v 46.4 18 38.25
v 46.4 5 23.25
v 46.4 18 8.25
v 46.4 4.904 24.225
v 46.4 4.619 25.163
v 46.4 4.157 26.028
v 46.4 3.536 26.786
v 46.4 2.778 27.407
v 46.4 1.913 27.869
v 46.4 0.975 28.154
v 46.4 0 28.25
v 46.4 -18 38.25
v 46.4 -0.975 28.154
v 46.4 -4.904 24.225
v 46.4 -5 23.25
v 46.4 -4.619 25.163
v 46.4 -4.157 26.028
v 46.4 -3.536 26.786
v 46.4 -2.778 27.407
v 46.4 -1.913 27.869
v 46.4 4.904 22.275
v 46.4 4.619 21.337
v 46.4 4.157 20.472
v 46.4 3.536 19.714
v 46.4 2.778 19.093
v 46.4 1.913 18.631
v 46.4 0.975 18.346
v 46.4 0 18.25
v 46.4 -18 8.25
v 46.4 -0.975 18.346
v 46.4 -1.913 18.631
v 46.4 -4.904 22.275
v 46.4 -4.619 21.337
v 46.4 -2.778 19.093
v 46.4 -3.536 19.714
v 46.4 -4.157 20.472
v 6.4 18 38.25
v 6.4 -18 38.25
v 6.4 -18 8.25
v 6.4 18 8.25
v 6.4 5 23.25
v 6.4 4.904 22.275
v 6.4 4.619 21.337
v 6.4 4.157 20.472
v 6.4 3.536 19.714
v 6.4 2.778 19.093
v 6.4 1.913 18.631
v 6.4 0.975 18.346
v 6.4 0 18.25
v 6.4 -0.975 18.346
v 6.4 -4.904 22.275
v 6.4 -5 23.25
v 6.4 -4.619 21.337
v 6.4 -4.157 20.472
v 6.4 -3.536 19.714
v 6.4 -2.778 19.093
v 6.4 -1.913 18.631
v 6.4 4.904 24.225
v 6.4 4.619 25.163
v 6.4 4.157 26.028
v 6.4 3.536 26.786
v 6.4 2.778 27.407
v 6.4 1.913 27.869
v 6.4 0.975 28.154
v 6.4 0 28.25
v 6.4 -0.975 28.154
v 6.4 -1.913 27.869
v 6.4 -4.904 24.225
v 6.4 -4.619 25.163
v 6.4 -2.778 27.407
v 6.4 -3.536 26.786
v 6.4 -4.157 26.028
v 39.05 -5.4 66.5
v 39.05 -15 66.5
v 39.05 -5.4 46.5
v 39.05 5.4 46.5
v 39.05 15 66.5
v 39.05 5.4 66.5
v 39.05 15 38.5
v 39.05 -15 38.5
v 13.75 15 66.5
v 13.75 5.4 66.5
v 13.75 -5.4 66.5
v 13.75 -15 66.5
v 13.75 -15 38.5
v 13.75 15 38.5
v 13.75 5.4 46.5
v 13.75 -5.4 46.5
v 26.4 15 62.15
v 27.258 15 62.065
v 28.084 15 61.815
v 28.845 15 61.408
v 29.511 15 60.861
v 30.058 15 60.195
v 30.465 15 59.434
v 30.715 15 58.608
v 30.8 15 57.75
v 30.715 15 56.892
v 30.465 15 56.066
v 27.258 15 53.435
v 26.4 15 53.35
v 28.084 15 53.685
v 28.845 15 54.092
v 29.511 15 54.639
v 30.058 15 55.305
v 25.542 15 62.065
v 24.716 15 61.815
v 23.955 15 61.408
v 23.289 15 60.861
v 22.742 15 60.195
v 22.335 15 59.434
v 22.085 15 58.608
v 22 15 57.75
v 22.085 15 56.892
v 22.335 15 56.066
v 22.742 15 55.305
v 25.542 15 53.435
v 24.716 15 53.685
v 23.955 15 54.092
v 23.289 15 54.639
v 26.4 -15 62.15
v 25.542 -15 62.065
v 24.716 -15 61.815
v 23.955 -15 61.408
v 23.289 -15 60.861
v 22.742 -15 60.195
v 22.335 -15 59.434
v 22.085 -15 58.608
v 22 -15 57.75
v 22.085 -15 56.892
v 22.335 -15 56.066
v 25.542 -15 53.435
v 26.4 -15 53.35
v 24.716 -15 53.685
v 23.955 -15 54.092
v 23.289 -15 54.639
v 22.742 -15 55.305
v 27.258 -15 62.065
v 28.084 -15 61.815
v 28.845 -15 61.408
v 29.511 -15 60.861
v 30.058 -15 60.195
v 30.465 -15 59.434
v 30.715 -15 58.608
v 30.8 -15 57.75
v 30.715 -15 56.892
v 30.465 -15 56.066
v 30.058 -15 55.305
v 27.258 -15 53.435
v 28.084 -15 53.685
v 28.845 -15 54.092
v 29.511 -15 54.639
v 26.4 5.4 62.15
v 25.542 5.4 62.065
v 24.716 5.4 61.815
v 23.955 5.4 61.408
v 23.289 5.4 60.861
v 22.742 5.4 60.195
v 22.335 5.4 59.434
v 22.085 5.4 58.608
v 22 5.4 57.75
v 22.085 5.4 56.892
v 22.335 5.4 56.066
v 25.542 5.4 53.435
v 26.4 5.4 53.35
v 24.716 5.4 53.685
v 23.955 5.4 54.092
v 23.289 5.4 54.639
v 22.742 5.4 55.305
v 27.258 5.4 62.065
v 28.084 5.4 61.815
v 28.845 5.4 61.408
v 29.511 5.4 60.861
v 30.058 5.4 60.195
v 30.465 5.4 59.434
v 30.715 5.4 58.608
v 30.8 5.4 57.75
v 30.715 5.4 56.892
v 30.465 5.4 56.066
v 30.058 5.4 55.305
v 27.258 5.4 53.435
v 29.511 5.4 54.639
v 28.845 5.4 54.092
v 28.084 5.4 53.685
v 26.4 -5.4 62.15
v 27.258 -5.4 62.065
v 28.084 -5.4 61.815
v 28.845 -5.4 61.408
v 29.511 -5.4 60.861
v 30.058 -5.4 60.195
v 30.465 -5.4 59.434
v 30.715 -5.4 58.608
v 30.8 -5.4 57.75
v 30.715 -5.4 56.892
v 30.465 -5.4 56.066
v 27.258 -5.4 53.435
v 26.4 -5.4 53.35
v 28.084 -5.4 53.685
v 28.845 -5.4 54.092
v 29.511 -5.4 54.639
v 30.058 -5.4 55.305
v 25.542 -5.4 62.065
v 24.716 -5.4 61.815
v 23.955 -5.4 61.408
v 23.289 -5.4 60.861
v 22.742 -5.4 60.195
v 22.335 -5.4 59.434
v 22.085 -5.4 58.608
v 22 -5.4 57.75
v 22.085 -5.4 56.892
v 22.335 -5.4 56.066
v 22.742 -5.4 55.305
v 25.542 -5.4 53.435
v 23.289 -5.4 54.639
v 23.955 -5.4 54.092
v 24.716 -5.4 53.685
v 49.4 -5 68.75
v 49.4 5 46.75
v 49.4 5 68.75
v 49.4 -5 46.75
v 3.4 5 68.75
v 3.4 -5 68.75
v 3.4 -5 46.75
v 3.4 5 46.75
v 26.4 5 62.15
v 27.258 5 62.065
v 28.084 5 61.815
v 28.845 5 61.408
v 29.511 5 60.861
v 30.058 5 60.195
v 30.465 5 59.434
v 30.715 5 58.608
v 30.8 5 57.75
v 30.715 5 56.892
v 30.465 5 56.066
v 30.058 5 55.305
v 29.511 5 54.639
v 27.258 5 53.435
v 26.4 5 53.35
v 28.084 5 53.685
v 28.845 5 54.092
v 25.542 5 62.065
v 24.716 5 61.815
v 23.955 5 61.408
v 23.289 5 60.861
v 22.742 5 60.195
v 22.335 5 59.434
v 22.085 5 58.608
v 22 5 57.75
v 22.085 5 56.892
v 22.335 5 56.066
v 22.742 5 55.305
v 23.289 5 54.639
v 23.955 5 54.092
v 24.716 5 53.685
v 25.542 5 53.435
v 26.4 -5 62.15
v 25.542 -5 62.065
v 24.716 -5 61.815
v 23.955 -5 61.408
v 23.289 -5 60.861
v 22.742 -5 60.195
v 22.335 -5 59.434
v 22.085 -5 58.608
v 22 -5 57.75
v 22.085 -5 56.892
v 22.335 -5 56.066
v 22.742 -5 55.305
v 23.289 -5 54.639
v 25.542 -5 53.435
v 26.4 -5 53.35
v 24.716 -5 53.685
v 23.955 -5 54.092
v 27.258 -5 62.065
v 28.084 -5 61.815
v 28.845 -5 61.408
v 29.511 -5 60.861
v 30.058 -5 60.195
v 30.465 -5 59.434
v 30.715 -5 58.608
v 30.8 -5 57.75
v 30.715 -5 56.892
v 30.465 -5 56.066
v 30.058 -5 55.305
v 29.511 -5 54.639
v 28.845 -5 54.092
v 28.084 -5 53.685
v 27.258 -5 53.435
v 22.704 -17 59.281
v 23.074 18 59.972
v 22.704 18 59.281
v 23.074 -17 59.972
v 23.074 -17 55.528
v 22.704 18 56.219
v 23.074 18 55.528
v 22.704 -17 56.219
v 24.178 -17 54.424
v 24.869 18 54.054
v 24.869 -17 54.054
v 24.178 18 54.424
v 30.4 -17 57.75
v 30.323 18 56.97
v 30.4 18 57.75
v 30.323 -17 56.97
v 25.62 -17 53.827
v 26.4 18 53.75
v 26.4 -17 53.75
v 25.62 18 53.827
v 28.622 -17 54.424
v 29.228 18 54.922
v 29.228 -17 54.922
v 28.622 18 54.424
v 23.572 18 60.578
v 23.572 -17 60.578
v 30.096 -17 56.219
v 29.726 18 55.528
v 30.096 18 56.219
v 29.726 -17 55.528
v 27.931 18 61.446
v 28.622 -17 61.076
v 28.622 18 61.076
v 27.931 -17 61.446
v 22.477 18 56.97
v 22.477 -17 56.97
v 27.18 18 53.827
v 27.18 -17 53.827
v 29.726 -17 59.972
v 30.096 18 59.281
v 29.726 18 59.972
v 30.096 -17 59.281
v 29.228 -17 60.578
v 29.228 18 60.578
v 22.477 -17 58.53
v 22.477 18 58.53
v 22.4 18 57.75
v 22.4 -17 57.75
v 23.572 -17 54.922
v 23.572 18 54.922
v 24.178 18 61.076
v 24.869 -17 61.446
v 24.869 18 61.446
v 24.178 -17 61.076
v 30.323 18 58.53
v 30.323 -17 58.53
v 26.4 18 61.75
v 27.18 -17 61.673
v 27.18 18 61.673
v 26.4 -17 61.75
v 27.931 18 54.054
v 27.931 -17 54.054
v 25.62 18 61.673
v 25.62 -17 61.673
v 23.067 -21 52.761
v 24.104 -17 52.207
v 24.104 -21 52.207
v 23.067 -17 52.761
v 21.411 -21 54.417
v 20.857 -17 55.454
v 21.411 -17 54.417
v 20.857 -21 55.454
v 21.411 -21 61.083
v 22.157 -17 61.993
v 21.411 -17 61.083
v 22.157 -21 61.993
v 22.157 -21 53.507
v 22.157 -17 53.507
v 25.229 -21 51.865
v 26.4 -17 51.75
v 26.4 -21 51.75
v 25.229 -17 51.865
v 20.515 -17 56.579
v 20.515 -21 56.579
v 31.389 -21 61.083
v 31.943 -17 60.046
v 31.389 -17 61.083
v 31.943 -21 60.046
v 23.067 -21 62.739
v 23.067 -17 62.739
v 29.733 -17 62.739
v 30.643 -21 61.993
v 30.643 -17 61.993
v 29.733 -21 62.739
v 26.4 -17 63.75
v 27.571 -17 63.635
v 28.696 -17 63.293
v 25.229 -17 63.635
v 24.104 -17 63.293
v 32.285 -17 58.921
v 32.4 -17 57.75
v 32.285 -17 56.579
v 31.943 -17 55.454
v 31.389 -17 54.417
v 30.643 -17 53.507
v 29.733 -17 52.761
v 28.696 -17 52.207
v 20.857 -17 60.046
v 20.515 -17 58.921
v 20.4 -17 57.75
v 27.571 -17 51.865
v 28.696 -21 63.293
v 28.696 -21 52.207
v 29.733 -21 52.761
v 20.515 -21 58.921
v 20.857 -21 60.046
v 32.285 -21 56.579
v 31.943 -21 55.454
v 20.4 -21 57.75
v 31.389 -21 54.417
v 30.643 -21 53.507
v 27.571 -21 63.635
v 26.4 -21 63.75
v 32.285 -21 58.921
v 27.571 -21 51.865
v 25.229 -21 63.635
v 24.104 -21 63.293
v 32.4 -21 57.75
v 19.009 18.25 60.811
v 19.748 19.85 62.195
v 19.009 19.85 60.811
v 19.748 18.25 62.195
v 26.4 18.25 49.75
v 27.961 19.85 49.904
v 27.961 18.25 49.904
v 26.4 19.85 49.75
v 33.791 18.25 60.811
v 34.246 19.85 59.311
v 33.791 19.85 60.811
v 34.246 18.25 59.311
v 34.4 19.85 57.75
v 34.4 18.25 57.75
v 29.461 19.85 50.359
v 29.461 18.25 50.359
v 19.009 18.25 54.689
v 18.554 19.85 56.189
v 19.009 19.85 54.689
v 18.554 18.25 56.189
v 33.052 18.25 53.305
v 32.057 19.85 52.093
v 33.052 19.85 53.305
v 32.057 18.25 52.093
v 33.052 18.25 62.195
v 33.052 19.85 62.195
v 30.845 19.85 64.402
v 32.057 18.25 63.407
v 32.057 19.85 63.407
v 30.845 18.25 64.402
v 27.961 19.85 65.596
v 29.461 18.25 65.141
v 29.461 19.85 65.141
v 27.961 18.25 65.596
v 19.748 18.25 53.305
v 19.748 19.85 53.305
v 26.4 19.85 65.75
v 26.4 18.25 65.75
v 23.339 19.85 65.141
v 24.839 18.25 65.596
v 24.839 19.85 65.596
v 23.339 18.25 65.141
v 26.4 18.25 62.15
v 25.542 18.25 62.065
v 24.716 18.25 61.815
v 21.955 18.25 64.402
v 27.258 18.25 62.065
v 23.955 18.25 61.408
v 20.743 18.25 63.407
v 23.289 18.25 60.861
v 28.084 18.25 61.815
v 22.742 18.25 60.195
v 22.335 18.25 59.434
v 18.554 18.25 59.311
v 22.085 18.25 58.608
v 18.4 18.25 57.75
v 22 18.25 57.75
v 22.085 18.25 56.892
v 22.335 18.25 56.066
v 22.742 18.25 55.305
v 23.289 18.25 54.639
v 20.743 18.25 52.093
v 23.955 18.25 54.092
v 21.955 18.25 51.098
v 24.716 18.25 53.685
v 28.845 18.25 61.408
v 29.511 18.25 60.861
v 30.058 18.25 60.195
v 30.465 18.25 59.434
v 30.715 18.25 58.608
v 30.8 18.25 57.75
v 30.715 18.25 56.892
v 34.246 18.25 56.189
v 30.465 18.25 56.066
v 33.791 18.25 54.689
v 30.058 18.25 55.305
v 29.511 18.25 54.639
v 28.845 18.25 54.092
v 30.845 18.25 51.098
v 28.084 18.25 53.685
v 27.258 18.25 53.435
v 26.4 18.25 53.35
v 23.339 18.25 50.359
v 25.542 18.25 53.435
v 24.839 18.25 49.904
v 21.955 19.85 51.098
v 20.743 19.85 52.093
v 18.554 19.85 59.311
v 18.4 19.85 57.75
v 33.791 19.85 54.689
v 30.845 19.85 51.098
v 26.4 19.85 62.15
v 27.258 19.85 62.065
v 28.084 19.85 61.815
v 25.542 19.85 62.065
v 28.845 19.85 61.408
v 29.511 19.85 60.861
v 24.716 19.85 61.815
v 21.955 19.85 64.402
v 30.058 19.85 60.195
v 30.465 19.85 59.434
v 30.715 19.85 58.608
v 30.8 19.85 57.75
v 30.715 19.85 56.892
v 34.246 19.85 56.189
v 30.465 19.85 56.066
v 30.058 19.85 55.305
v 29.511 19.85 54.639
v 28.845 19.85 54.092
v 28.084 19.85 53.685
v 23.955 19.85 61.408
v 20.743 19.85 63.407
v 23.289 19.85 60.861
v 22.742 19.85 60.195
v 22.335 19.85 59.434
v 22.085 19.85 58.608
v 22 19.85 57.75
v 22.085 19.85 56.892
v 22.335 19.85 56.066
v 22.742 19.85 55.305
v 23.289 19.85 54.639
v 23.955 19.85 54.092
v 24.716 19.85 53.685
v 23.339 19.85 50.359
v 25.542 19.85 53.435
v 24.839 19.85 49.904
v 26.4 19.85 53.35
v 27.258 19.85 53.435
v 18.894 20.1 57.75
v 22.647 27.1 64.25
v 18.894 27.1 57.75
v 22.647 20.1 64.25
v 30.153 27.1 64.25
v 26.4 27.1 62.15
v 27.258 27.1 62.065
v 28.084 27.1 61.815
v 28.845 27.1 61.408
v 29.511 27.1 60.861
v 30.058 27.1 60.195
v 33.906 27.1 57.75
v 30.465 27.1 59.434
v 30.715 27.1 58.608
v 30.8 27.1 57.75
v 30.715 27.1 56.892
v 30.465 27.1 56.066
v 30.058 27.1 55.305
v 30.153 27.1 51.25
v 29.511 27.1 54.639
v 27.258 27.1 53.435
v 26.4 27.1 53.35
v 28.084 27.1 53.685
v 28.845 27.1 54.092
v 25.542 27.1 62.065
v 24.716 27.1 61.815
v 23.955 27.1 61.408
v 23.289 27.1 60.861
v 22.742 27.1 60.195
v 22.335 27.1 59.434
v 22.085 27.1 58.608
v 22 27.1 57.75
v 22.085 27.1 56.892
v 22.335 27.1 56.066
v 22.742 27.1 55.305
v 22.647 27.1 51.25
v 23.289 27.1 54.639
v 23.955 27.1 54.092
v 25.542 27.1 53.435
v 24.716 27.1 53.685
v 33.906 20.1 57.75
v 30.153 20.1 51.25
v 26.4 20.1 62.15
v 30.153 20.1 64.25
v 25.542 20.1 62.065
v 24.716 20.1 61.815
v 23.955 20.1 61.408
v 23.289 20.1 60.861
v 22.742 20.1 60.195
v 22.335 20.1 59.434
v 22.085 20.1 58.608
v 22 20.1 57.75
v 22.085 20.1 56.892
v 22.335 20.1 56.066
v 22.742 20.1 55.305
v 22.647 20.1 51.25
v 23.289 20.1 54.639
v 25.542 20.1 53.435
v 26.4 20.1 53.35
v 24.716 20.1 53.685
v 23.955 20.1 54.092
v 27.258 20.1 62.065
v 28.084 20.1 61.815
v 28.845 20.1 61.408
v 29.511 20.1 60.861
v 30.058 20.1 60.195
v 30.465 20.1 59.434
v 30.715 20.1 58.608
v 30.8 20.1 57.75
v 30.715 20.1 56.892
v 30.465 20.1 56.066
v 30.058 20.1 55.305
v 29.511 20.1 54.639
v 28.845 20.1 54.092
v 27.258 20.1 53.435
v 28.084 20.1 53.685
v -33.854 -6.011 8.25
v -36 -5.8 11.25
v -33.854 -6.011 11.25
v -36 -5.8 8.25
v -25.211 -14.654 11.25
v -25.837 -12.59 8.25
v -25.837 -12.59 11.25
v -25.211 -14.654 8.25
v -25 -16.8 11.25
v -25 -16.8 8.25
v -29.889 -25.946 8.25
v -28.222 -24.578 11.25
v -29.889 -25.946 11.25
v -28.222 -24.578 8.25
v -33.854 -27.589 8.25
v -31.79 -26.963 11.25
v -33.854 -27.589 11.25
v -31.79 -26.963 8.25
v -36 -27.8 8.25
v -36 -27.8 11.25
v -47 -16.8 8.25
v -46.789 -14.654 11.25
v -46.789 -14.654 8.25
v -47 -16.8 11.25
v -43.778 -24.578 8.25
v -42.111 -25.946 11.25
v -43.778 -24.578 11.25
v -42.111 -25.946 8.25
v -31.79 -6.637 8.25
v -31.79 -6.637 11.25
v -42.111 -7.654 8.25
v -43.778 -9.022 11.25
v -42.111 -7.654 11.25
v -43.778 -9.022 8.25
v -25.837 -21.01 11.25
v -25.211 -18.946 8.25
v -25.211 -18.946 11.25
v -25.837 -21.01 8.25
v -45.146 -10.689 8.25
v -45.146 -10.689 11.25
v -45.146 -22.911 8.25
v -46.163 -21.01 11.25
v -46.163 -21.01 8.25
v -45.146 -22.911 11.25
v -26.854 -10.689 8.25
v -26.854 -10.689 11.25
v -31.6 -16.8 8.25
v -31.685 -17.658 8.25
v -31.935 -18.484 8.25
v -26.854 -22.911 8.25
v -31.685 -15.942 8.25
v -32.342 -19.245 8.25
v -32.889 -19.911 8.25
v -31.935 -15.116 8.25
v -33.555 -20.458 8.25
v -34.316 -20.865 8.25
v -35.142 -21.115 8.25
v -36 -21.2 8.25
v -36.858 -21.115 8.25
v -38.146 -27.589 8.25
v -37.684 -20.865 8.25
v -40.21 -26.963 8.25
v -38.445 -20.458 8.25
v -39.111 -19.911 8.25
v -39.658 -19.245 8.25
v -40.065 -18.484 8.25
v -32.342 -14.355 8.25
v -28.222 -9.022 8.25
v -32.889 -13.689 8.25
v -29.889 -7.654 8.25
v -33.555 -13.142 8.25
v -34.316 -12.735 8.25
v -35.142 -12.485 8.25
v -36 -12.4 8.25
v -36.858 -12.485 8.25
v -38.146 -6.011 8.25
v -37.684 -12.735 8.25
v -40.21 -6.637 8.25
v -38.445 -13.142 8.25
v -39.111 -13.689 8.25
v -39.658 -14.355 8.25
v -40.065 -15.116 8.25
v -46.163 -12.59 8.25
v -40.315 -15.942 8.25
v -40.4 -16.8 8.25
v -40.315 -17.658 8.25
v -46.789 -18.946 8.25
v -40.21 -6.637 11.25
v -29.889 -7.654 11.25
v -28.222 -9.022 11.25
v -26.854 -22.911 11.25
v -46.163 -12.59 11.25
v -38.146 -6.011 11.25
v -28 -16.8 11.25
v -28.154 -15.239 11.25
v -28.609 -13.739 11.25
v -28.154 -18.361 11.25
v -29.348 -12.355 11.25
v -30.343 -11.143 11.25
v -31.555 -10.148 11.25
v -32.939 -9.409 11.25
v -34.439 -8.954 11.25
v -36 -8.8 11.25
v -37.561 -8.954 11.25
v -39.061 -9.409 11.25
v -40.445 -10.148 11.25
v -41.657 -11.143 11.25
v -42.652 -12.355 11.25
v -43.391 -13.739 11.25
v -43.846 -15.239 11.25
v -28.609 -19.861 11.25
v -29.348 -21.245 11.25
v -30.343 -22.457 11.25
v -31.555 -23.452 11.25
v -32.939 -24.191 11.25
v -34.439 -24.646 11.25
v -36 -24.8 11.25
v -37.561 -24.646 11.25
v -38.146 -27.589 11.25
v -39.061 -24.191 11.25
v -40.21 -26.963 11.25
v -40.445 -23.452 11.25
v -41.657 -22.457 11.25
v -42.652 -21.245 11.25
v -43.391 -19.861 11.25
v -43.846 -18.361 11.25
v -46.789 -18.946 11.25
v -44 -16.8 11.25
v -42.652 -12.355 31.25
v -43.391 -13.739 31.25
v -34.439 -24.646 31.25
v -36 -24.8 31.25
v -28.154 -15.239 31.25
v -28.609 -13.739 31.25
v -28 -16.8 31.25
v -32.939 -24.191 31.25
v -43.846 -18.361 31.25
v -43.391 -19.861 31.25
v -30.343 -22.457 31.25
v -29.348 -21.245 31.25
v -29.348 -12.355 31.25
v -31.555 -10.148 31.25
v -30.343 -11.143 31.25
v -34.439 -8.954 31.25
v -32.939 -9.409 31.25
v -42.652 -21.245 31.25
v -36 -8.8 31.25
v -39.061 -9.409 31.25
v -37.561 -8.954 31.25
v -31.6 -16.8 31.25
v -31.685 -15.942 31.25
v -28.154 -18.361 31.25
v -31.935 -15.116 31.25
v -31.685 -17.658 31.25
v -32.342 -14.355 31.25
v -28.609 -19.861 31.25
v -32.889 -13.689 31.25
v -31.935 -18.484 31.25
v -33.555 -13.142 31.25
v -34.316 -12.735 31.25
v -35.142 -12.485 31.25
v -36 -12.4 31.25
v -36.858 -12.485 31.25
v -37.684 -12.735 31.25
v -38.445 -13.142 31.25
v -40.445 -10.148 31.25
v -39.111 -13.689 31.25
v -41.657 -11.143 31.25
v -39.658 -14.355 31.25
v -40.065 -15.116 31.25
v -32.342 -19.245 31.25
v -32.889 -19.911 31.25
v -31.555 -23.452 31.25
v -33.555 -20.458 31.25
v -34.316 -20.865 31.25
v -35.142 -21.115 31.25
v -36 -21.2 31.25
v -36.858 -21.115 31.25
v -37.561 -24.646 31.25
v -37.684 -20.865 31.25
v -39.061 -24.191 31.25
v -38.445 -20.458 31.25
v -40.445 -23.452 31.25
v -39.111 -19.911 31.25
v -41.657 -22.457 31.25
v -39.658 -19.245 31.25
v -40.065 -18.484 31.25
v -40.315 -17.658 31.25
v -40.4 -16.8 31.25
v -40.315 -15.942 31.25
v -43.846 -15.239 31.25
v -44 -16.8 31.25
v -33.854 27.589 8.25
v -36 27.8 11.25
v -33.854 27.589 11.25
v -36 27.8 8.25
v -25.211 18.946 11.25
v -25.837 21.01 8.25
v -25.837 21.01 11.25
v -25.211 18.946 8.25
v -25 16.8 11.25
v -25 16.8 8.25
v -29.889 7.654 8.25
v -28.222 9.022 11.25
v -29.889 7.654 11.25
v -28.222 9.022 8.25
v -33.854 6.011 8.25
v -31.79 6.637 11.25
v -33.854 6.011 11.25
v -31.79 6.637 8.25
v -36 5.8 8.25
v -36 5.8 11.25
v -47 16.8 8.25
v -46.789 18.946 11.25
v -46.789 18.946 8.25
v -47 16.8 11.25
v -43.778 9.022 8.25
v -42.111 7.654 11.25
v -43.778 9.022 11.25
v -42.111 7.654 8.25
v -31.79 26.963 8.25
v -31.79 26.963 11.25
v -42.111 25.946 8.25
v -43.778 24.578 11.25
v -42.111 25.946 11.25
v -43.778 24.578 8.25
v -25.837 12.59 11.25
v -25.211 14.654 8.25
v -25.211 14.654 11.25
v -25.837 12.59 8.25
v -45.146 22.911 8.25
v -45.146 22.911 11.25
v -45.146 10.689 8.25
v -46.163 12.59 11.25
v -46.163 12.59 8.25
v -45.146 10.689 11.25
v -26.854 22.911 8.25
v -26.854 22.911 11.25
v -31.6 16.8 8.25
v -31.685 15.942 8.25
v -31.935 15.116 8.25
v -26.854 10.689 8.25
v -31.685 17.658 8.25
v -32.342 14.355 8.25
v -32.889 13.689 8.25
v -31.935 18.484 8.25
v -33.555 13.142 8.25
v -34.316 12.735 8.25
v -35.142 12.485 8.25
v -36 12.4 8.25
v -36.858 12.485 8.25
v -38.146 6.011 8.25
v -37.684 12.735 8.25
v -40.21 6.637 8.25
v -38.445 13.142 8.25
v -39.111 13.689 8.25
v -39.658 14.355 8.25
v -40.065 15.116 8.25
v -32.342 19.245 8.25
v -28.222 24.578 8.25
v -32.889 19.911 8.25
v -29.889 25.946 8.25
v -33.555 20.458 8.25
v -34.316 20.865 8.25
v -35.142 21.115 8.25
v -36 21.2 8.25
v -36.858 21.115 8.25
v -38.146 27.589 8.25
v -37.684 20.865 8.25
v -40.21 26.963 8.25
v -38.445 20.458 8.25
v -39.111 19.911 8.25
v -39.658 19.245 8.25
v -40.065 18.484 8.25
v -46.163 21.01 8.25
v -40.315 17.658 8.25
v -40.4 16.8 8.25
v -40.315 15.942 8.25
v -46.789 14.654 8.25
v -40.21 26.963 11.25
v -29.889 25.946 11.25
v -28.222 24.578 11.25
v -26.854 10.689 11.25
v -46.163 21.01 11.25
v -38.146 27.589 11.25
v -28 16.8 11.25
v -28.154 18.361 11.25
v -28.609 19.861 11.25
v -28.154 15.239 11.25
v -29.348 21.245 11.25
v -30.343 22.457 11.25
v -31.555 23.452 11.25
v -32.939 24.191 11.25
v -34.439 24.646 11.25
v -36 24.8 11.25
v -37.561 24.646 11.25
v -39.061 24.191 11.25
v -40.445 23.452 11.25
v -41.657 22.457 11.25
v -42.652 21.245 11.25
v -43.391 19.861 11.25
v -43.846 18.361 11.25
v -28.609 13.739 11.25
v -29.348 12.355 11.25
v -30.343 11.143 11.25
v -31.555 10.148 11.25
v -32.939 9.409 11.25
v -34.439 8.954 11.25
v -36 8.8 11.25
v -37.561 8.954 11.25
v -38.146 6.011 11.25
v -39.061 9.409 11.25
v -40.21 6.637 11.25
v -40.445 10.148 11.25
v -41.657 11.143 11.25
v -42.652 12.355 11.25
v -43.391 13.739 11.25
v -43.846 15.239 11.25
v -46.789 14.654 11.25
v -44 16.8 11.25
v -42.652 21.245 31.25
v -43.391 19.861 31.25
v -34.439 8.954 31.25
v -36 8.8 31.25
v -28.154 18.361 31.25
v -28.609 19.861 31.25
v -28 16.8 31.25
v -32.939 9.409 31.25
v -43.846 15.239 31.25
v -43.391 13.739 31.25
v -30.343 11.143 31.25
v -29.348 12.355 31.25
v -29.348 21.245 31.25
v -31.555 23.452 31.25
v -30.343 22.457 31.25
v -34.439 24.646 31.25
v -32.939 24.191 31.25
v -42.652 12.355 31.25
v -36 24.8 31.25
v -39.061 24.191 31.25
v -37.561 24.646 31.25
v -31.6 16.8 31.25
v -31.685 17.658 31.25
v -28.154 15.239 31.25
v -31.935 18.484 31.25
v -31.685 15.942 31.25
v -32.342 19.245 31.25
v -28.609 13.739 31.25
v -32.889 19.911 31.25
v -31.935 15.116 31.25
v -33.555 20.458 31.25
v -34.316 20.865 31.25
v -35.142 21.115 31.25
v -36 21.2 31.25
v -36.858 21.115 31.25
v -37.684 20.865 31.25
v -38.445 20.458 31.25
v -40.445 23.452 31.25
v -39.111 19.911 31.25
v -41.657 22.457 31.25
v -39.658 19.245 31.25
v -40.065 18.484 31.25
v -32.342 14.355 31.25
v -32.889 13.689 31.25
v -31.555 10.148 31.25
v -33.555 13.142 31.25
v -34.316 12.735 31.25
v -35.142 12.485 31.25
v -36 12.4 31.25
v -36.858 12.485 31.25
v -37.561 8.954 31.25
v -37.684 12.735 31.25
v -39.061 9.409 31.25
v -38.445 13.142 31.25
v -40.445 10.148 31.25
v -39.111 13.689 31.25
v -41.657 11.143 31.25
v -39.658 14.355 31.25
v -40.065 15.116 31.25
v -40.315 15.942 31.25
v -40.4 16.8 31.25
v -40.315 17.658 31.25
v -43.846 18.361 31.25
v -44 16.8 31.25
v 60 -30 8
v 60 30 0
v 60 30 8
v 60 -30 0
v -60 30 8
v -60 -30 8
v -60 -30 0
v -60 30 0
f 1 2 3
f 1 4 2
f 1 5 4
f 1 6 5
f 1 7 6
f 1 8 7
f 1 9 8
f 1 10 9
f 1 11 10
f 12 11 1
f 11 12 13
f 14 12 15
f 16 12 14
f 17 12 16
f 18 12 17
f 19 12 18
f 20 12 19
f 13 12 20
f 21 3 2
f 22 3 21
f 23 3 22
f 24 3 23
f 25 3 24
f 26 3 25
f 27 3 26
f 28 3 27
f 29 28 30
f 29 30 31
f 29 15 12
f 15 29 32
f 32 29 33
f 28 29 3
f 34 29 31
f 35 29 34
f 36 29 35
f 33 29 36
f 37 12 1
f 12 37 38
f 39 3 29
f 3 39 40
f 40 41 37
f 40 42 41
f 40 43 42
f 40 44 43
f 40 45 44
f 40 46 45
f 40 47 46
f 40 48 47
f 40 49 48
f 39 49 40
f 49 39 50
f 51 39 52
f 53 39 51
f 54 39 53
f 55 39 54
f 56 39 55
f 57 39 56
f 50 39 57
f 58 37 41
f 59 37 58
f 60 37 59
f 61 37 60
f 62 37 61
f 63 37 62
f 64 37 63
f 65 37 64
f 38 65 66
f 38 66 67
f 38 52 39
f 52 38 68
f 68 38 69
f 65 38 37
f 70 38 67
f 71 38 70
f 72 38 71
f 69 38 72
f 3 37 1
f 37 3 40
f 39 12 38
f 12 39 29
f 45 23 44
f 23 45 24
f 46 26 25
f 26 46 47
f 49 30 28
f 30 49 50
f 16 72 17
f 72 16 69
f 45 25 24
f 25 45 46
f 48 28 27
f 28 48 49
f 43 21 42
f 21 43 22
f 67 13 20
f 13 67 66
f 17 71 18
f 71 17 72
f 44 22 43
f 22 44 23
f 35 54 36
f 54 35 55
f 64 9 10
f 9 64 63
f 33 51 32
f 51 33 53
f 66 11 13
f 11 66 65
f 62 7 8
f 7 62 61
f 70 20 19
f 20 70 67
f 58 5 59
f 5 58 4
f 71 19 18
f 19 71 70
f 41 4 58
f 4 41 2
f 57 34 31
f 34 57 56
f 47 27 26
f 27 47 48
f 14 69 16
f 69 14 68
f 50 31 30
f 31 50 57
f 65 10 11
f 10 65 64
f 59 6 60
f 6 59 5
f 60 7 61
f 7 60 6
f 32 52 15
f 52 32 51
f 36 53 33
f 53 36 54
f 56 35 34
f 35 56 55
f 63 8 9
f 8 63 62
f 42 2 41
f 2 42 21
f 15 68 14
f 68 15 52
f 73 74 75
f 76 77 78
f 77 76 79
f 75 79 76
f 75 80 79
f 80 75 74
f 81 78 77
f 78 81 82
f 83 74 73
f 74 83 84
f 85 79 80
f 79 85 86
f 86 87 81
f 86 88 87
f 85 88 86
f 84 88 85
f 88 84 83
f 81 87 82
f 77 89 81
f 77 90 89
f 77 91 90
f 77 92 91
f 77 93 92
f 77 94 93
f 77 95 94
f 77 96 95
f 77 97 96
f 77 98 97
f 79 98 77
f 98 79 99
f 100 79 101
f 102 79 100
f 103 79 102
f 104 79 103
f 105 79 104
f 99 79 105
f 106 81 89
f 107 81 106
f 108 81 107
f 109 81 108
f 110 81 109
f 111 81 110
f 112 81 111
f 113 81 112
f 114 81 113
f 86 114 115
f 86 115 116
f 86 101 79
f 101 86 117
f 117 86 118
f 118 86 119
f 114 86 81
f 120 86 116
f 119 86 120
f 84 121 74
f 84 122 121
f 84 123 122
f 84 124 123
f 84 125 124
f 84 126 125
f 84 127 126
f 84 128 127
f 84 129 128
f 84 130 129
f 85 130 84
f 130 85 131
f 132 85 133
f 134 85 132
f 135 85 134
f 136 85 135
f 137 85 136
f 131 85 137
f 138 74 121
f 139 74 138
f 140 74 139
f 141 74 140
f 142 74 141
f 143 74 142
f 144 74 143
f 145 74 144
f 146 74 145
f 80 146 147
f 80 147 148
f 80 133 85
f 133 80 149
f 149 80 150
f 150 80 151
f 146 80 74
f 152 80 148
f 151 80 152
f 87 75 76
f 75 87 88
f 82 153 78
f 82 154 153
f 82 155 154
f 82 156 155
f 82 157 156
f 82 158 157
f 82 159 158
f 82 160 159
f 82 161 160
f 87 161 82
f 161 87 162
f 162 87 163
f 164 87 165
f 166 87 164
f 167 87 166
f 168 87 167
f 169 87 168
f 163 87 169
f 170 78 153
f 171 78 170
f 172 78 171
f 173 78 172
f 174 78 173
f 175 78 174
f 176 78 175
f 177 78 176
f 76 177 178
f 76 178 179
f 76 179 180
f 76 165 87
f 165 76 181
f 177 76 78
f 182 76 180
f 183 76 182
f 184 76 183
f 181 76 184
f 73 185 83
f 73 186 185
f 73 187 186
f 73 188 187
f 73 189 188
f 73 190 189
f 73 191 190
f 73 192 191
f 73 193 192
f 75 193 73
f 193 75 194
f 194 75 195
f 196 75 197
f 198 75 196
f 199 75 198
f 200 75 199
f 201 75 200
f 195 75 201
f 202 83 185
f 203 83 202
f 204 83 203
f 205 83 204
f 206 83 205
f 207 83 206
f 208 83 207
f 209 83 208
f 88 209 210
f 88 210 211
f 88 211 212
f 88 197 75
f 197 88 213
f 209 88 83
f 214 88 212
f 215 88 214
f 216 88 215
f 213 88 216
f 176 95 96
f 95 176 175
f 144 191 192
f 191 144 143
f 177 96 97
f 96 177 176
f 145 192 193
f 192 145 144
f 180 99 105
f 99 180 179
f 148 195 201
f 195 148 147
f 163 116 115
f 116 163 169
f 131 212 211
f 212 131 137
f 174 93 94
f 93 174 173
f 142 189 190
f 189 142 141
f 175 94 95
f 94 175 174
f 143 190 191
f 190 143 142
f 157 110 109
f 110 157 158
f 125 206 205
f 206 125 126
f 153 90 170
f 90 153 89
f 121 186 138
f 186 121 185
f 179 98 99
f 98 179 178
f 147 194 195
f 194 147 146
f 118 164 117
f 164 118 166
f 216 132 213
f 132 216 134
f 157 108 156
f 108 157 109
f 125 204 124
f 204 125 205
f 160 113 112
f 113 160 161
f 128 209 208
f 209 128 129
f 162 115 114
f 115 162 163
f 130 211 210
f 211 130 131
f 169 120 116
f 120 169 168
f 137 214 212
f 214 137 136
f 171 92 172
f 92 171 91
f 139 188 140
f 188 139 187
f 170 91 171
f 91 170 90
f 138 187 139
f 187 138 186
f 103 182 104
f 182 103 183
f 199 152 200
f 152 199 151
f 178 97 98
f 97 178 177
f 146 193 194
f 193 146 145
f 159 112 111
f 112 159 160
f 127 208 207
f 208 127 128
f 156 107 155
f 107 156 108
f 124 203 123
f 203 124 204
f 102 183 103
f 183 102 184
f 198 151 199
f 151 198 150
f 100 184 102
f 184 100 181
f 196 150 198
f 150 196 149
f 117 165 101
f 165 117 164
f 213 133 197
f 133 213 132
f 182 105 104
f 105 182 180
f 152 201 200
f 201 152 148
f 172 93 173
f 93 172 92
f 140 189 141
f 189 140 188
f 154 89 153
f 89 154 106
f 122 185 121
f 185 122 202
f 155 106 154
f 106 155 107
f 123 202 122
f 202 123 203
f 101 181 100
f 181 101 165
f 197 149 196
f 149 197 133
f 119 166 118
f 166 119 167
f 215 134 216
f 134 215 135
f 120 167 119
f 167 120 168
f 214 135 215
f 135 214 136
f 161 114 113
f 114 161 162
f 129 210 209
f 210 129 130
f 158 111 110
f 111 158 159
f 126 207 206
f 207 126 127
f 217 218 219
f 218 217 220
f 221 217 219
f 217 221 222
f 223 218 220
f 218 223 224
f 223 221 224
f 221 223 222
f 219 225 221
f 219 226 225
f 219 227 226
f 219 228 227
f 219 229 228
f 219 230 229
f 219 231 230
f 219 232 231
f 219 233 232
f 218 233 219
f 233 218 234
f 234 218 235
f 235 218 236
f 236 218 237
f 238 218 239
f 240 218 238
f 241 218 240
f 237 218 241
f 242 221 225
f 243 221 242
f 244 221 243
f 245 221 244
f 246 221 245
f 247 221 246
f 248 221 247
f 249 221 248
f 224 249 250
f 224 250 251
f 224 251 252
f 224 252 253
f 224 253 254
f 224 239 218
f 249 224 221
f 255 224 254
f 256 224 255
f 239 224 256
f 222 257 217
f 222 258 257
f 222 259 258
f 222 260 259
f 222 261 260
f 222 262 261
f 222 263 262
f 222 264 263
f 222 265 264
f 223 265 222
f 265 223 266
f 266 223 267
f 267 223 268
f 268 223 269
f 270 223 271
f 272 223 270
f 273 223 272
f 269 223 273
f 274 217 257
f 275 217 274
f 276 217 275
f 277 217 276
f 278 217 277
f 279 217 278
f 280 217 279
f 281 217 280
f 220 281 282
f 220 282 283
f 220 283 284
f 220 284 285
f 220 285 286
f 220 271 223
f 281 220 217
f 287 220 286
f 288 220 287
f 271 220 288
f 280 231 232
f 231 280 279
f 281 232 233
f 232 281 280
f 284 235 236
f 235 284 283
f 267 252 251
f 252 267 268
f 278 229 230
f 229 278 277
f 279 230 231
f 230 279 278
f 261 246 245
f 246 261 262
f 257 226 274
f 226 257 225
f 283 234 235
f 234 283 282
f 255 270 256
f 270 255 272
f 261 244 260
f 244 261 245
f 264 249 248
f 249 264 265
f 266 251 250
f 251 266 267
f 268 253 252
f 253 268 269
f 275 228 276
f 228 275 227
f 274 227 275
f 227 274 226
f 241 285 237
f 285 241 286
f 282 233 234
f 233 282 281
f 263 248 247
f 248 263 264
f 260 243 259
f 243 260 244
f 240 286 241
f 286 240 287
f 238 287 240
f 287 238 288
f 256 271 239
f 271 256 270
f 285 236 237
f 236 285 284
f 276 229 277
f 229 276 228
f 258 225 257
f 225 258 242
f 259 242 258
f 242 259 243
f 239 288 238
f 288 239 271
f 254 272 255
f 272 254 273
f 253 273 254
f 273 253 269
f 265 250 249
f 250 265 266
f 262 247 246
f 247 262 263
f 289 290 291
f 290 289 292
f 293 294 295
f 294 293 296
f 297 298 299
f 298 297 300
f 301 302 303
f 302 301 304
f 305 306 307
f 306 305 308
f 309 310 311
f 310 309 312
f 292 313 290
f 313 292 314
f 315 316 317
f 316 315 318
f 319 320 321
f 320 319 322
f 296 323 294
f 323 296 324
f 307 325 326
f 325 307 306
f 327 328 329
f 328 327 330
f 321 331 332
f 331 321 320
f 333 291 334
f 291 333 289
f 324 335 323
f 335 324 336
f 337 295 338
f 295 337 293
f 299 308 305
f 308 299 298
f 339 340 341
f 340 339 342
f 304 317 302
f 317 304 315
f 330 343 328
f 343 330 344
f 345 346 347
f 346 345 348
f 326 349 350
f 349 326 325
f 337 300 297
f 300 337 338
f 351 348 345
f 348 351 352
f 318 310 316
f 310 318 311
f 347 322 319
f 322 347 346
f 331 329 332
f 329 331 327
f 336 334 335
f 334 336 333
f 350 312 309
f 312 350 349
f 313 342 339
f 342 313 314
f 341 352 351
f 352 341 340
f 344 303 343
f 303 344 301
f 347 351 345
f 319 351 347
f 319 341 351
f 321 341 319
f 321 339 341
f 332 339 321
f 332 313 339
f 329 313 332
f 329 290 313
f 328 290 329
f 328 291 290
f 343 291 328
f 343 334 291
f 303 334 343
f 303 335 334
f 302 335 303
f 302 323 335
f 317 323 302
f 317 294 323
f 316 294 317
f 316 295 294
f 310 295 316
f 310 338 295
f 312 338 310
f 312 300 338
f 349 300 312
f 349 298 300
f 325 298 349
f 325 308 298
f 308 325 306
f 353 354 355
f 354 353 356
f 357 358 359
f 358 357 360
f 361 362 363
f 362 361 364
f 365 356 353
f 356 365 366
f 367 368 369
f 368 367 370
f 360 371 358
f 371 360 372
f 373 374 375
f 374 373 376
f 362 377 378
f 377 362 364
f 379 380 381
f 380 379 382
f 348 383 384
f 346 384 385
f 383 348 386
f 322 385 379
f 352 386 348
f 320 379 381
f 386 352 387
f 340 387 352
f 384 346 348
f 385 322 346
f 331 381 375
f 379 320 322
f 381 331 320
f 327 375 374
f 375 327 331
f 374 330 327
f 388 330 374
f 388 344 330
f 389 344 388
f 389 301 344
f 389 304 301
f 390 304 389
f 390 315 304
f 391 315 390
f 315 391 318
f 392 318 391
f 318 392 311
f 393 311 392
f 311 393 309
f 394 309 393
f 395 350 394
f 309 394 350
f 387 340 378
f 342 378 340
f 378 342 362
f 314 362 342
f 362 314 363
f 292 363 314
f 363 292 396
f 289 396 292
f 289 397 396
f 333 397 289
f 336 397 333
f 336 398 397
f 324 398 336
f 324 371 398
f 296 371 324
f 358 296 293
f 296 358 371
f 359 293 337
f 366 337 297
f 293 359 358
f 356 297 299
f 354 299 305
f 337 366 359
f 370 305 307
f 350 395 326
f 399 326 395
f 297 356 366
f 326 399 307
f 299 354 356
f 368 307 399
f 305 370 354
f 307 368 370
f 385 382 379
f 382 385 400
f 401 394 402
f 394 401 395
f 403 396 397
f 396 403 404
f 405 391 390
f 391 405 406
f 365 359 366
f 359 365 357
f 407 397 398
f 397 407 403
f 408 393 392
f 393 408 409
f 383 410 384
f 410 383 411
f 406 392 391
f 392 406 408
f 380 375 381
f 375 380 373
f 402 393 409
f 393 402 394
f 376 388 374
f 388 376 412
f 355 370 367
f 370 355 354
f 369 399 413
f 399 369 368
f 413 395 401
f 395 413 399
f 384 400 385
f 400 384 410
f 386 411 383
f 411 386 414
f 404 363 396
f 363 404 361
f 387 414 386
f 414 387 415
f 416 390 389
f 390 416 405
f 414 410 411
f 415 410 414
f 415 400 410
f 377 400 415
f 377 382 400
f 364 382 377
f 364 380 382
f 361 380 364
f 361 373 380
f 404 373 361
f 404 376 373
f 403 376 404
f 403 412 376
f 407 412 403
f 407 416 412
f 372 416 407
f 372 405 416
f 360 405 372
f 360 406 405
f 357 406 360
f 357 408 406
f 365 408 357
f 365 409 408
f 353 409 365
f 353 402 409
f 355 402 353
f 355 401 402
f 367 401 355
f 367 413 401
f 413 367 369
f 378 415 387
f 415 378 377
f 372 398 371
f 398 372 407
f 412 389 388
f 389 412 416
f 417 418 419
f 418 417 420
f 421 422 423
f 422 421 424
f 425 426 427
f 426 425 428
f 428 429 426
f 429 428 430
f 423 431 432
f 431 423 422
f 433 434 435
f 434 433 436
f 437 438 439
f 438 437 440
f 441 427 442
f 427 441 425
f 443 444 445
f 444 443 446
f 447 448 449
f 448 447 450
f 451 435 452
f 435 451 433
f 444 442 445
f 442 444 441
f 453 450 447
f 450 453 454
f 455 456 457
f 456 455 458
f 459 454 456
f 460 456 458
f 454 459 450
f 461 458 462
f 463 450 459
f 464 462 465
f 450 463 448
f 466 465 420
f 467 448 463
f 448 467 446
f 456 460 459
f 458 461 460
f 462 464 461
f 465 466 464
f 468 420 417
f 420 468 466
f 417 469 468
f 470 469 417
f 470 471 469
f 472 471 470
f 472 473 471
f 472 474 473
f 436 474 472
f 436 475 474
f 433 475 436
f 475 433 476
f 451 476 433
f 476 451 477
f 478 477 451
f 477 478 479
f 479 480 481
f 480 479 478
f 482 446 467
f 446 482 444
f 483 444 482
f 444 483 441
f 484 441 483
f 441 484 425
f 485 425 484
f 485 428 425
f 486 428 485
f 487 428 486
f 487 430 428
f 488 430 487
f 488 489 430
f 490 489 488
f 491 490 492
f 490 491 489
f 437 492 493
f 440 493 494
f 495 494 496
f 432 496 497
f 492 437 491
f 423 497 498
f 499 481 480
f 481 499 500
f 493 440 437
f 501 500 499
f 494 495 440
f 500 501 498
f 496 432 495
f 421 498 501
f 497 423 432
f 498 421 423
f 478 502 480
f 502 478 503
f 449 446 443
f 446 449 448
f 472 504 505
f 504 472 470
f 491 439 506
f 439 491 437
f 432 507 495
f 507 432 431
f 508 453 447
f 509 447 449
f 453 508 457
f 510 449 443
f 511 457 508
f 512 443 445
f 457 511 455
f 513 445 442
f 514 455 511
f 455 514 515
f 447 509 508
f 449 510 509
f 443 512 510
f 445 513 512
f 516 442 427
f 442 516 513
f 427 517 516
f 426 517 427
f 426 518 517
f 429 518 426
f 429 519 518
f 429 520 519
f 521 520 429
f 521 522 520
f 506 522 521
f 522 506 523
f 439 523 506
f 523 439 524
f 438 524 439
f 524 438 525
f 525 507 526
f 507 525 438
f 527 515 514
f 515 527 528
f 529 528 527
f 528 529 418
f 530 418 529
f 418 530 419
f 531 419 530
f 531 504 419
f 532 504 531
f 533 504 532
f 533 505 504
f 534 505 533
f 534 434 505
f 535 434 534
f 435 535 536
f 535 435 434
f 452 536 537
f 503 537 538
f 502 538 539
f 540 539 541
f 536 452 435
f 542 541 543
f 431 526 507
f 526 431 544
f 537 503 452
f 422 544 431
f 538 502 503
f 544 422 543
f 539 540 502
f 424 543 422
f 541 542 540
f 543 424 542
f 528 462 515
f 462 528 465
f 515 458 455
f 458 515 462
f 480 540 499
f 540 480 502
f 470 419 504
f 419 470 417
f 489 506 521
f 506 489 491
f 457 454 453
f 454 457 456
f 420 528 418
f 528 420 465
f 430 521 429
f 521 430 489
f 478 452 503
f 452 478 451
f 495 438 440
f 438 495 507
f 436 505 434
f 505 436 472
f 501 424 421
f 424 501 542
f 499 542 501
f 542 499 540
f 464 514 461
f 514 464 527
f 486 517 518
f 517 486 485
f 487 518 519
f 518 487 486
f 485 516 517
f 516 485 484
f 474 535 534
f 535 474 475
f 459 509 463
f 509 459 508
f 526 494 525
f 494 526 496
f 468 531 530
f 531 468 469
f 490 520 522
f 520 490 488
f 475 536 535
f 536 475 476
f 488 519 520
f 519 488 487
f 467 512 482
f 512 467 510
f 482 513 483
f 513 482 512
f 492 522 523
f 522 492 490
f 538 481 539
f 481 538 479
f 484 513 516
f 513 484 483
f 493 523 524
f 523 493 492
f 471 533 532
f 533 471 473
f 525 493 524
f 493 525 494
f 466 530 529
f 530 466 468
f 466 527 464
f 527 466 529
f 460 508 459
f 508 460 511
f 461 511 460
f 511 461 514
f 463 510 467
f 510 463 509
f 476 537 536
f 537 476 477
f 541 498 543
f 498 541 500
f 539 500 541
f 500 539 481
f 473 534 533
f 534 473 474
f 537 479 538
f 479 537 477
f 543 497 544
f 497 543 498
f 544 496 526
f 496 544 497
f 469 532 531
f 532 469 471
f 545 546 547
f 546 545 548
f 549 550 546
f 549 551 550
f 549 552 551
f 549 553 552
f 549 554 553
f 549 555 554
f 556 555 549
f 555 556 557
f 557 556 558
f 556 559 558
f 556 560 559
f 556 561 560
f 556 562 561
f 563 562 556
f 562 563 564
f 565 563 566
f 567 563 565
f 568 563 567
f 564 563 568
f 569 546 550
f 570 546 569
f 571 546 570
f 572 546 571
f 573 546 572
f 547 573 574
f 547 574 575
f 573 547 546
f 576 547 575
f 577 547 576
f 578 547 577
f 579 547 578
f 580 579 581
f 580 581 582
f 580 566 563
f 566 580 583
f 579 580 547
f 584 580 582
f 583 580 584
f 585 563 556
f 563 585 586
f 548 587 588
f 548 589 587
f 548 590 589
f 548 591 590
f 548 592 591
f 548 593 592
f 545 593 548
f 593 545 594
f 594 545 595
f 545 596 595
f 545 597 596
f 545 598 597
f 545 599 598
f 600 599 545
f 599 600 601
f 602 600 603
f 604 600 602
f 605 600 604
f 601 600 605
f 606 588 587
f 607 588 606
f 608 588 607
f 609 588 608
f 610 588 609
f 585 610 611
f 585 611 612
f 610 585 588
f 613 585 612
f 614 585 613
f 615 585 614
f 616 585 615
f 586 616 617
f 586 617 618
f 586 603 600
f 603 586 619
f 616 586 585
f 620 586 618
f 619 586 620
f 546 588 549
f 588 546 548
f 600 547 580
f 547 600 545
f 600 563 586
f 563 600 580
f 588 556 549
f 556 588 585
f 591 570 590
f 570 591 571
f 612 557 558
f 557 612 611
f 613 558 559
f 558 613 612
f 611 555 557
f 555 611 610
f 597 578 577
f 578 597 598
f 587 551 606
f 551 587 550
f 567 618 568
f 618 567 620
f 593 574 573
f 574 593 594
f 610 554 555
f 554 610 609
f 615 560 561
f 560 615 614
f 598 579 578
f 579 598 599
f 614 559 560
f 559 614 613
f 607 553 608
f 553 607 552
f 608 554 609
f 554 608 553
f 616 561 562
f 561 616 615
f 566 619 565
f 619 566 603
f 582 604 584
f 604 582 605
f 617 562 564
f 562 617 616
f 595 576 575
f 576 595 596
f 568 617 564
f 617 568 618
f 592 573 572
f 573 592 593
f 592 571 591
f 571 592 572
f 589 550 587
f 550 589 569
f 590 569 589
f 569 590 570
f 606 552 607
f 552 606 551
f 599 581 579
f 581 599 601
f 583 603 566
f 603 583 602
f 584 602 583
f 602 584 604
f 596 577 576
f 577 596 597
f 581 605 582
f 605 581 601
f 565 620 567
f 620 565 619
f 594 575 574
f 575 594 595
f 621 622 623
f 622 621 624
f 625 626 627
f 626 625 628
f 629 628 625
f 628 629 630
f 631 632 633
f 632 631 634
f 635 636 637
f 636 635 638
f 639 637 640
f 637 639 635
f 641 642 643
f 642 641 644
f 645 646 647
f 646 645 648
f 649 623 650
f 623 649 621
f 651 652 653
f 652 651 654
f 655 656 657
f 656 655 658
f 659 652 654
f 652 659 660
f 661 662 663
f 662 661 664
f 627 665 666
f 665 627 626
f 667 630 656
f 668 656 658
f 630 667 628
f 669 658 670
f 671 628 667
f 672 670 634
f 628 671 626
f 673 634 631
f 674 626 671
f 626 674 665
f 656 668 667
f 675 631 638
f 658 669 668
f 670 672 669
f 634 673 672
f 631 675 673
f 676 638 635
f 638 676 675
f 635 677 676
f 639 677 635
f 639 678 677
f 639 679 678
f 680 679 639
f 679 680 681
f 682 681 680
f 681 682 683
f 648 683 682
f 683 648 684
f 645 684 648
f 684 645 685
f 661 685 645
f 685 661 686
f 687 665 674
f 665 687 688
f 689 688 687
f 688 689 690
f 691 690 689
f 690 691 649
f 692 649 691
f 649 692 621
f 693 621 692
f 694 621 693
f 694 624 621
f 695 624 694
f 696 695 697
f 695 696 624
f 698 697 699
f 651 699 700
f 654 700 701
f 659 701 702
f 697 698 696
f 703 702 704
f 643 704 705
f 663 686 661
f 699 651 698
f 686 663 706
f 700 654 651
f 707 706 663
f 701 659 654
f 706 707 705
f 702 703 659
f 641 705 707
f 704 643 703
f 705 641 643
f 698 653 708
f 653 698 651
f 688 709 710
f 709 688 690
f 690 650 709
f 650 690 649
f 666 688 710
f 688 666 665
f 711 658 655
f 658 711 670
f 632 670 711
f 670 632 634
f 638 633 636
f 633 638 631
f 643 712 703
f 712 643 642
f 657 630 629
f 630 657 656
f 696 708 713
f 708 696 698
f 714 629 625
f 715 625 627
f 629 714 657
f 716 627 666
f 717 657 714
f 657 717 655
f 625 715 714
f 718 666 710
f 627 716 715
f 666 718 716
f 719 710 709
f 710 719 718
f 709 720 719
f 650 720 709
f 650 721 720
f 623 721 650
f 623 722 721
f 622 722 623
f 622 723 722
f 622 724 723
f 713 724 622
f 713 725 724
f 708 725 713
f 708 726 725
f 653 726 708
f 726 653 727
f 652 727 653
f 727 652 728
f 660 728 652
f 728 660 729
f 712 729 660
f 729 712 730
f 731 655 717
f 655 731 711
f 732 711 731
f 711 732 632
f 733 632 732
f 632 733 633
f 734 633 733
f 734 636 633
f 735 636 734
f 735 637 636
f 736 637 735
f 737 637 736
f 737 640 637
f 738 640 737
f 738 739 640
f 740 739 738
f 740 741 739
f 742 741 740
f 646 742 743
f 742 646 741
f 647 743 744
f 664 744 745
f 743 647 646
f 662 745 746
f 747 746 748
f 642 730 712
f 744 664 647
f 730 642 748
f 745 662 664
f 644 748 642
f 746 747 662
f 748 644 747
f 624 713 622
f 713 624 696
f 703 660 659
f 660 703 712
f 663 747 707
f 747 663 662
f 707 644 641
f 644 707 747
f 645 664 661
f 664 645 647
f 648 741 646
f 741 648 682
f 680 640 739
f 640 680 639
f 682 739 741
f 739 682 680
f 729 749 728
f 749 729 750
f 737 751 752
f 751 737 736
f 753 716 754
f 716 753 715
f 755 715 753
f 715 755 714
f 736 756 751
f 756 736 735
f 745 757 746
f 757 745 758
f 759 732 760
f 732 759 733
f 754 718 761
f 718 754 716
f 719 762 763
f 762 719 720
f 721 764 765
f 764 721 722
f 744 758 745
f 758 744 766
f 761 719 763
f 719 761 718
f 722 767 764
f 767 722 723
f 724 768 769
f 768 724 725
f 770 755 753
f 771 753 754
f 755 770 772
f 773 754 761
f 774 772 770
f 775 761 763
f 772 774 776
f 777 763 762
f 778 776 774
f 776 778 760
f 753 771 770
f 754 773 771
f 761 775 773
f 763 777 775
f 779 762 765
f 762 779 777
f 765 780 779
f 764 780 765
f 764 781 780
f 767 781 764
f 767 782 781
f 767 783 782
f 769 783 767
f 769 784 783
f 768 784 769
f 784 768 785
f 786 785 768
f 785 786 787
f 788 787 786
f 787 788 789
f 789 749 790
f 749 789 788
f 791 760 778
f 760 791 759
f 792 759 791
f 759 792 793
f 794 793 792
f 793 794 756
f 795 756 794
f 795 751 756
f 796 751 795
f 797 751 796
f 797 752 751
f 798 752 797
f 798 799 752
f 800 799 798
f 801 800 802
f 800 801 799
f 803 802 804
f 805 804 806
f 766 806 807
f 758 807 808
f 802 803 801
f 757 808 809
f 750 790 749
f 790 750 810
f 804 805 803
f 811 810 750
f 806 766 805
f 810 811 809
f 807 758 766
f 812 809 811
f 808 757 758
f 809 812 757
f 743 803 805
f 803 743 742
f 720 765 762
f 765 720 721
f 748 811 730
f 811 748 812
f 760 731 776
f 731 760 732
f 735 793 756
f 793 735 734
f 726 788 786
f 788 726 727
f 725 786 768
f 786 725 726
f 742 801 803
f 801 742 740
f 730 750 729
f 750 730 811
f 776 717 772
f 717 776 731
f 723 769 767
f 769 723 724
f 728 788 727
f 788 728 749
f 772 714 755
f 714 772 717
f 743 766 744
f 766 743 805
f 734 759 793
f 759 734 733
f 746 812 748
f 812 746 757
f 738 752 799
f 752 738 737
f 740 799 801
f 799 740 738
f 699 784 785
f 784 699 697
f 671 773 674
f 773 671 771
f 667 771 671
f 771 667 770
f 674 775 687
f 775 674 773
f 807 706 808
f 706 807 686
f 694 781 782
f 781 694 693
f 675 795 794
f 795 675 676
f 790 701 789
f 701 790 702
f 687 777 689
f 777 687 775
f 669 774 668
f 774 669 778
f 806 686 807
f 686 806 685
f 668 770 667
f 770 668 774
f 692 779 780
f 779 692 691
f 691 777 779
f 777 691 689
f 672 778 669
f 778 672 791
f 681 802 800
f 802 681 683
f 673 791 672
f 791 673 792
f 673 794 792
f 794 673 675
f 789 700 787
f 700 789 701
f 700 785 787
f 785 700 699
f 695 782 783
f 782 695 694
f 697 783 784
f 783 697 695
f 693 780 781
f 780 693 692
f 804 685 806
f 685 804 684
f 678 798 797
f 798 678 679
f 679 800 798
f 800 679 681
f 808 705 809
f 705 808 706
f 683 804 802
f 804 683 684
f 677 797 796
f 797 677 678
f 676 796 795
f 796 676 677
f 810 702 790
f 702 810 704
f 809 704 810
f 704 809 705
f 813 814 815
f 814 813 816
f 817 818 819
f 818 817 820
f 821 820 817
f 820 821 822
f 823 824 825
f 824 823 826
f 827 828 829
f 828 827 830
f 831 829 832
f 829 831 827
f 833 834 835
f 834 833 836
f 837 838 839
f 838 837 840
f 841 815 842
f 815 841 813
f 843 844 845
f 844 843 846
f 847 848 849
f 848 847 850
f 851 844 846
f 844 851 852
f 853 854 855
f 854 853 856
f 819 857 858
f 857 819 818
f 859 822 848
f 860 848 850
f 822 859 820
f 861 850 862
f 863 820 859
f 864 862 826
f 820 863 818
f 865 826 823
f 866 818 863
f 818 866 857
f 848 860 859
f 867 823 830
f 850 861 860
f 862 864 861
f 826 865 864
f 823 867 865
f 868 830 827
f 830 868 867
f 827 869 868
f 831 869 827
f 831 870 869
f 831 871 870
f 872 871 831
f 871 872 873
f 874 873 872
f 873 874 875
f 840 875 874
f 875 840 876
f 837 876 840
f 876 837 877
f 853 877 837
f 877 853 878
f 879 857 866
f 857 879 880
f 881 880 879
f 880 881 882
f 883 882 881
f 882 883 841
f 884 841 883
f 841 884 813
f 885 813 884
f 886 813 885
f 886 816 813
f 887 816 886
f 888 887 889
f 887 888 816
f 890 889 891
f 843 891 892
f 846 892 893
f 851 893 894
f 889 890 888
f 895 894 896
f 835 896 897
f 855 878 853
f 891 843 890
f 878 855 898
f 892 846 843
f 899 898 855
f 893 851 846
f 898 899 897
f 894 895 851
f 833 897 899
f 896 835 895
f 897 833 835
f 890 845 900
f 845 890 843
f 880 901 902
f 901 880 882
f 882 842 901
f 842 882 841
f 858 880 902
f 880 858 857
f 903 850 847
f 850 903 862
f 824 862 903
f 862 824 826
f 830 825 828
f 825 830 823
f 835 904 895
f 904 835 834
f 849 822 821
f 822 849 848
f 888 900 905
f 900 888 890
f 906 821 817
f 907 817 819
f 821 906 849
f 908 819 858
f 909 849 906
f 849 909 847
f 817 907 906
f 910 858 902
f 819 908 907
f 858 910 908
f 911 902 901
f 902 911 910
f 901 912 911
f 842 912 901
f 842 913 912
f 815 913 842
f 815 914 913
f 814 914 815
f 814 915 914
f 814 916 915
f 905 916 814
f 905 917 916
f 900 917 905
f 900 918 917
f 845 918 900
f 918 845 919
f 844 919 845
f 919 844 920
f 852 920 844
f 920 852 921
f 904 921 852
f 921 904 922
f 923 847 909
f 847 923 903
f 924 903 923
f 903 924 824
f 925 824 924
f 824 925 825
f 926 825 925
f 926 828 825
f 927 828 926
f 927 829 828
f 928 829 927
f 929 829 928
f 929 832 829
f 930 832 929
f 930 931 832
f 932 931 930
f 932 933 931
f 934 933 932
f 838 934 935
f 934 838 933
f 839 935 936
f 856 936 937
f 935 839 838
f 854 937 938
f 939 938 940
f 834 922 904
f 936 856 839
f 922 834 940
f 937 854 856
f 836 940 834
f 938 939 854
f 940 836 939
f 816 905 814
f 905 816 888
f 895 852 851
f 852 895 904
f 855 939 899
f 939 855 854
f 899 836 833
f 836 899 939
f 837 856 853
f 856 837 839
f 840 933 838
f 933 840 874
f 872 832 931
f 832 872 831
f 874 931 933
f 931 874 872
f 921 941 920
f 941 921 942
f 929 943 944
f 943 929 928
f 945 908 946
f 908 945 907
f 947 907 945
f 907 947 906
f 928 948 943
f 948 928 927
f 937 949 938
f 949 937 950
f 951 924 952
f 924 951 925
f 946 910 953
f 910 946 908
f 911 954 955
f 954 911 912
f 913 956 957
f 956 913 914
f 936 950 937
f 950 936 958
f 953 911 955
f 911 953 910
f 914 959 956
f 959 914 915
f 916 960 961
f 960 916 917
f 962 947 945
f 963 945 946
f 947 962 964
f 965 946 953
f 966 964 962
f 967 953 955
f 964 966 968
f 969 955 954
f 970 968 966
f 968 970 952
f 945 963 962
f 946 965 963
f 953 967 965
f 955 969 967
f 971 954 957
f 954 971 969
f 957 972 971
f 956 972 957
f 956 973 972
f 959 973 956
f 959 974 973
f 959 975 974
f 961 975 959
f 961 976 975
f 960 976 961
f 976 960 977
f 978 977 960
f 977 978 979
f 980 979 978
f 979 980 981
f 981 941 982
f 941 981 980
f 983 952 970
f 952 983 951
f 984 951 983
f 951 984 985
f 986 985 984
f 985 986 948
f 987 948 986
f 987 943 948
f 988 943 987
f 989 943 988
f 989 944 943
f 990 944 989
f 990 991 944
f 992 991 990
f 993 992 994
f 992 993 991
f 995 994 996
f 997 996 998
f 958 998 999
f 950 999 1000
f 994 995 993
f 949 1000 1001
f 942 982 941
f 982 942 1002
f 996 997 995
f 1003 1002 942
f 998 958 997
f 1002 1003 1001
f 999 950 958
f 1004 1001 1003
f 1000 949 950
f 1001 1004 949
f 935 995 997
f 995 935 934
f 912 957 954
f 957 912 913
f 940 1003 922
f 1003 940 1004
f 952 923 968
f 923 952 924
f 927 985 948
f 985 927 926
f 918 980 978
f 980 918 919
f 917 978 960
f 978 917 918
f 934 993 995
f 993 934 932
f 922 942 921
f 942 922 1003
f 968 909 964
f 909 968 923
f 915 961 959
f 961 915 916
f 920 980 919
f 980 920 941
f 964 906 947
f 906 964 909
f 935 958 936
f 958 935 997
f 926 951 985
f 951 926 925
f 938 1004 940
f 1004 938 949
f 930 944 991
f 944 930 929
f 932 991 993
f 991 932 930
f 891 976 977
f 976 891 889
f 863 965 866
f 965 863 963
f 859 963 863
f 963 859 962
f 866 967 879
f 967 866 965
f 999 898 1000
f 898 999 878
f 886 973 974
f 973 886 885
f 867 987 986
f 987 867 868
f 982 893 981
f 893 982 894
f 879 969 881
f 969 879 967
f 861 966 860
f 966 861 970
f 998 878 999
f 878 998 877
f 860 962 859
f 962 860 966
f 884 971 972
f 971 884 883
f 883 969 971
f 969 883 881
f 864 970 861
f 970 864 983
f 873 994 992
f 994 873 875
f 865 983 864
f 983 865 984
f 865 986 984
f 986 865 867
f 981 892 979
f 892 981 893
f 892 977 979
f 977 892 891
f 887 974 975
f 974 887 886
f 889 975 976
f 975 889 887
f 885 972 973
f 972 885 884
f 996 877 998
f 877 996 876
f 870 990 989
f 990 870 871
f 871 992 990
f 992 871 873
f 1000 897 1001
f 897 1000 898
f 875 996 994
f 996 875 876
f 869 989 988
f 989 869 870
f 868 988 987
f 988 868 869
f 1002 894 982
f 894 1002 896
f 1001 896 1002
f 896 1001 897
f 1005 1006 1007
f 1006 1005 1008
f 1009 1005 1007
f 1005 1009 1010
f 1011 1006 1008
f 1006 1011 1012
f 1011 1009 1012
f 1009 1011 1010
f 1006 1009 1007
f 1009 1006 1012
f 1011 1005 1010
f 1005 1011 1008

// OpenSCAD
$fn = 32;

// ------------------------------------------------------------------------
// Indexing jig: plate 120 x 60 mm, pin d8
// Every part is its own module, assembly() places every instance.
// ------------------------------------------------------------------------

// --- part 1 ---
module jig_plate() {
  difference() {
    translate([-60, -30, 0]) cube([120, 60, 8]);
  }
}

// --- part 2 ---
module locator_block() {
  difference() {
    translate([-20, -18, 0]) cube([40, 36, 30]);
    translate([0, 0, 15]) rotate([0, 90, 0]) cylinder(h = 42, d = 10, center = true);
  }
}

// --- part 3 ---
module index_fork() {
  difference() {
    translate([-12.65, -15, 0]) cube([25.3, 30, 28]);
    translate([-13.65, -5.4, 8]) cube([27.3, 10.8, 21]);
    translate([0, 0, 19.25]) rotate([90, 0, 0]) cylinder(h = 32, d = 8.8, center = true);
  }
}

// --- part 4 ---
module index_arm() {
  difference() {
    translate([-23, -5, 0]) cube([46, 10, 22]);
    translate([0, 0, 11]) rotate([90, 0, 0]) cylinder(h = 12, d = 8.8, center = true);
  }
}

// --- part 5 ---
module index_pin() {
  rotate([0, 90, 0]) cylinder(h = 36, d = 8, center = true);
  translate([-21, 0, 0]) rotate([0, 90, 0]) cylinder(h = 4, d = 12);
}

// --- part 6 ---
module pin_washer() {
  difference() {
      translate([0, 0, 0]) cylinder(h = 1.6, d = 16);
      translate([0, 0, -1]) cylinder(h = 3.6, d = 8.8);
    }
}

// --- part 7 ---
module lock_nut() {
  difference() {
    linear_extrude(height = 7) polygon(points = [[7.506, 0], [3.753, 6.5], [-3.753, 6.5], [-7.506, 0], [-3.753, -6.5], [3.753, -6.5]]);
    translate([0, 0, -1]) cylinder(h = 9, d = 8.8);
  }
}

// --- part 8 ---
module guide_bush_a() {
  difference() {
    union() {
      cylinder(h = 3, d = 22);
      translate([0, 0, 3]) cylinder(h = 20, d = 16);
    }
    translate([0, 0, -1]) cylinder(h = 25, d = 8.8);
  }
}

// --- part 9 ---
module guide_bush_b() {
  difference() {
    union() {
      cylinder(h = 3, d = 22);
      translate([0, 0, 3]) cylinder(h = 20, d = 16);
    }
    translate([0, 0, -1]) cylinder(h = 25, d = 8.8);
  }
}

// --- assembly ---
module assembly() {
  color([0.80, 0.24, 0.20]) translate([0, 0, 0]) rotate([0, 0, 0]) jig_plate();
  color([0.20, 0.45, 0.75]) translate([26.4, 0, 8.25]) rotate([0, 0, 0]) locator_block();
  color([0.25, 0.62, 0.32]) translate([26.4, 0, 38.5]) rotate([0, 0, 0]) index_fork();
  color([0.92, 0.70, 0.18]) translate([26.4, 0, 46.75]) rotate([0, 0, 0]) index_arm();
  color([0.58, 0.35, 0.70]) translate([26.4, 0, 57.75]) rotate([0, 0, 90]) index_pin();
  color([0.16, 0.66, 0.66]) translate([26.4, 19.85, 57.75]) rotate([90, 0, 0]) pin_washer();
  color([0.85, 0.48, 0.18]) translate([26.4, 27.1, 57.75]) rotate([90, 0, 0]) lock_nut();
  color([0.55, 0.60, 0.65]) translate([-36, -16.8, 8.25]) rotate([0, 0, 0]) guide_bush_a();
  color([0.75, 0.30, 0.55]) translate([-36, 16.8, 8.25]) rotate([0, 0, 0]) guide_bush_b();
}

assembly();
